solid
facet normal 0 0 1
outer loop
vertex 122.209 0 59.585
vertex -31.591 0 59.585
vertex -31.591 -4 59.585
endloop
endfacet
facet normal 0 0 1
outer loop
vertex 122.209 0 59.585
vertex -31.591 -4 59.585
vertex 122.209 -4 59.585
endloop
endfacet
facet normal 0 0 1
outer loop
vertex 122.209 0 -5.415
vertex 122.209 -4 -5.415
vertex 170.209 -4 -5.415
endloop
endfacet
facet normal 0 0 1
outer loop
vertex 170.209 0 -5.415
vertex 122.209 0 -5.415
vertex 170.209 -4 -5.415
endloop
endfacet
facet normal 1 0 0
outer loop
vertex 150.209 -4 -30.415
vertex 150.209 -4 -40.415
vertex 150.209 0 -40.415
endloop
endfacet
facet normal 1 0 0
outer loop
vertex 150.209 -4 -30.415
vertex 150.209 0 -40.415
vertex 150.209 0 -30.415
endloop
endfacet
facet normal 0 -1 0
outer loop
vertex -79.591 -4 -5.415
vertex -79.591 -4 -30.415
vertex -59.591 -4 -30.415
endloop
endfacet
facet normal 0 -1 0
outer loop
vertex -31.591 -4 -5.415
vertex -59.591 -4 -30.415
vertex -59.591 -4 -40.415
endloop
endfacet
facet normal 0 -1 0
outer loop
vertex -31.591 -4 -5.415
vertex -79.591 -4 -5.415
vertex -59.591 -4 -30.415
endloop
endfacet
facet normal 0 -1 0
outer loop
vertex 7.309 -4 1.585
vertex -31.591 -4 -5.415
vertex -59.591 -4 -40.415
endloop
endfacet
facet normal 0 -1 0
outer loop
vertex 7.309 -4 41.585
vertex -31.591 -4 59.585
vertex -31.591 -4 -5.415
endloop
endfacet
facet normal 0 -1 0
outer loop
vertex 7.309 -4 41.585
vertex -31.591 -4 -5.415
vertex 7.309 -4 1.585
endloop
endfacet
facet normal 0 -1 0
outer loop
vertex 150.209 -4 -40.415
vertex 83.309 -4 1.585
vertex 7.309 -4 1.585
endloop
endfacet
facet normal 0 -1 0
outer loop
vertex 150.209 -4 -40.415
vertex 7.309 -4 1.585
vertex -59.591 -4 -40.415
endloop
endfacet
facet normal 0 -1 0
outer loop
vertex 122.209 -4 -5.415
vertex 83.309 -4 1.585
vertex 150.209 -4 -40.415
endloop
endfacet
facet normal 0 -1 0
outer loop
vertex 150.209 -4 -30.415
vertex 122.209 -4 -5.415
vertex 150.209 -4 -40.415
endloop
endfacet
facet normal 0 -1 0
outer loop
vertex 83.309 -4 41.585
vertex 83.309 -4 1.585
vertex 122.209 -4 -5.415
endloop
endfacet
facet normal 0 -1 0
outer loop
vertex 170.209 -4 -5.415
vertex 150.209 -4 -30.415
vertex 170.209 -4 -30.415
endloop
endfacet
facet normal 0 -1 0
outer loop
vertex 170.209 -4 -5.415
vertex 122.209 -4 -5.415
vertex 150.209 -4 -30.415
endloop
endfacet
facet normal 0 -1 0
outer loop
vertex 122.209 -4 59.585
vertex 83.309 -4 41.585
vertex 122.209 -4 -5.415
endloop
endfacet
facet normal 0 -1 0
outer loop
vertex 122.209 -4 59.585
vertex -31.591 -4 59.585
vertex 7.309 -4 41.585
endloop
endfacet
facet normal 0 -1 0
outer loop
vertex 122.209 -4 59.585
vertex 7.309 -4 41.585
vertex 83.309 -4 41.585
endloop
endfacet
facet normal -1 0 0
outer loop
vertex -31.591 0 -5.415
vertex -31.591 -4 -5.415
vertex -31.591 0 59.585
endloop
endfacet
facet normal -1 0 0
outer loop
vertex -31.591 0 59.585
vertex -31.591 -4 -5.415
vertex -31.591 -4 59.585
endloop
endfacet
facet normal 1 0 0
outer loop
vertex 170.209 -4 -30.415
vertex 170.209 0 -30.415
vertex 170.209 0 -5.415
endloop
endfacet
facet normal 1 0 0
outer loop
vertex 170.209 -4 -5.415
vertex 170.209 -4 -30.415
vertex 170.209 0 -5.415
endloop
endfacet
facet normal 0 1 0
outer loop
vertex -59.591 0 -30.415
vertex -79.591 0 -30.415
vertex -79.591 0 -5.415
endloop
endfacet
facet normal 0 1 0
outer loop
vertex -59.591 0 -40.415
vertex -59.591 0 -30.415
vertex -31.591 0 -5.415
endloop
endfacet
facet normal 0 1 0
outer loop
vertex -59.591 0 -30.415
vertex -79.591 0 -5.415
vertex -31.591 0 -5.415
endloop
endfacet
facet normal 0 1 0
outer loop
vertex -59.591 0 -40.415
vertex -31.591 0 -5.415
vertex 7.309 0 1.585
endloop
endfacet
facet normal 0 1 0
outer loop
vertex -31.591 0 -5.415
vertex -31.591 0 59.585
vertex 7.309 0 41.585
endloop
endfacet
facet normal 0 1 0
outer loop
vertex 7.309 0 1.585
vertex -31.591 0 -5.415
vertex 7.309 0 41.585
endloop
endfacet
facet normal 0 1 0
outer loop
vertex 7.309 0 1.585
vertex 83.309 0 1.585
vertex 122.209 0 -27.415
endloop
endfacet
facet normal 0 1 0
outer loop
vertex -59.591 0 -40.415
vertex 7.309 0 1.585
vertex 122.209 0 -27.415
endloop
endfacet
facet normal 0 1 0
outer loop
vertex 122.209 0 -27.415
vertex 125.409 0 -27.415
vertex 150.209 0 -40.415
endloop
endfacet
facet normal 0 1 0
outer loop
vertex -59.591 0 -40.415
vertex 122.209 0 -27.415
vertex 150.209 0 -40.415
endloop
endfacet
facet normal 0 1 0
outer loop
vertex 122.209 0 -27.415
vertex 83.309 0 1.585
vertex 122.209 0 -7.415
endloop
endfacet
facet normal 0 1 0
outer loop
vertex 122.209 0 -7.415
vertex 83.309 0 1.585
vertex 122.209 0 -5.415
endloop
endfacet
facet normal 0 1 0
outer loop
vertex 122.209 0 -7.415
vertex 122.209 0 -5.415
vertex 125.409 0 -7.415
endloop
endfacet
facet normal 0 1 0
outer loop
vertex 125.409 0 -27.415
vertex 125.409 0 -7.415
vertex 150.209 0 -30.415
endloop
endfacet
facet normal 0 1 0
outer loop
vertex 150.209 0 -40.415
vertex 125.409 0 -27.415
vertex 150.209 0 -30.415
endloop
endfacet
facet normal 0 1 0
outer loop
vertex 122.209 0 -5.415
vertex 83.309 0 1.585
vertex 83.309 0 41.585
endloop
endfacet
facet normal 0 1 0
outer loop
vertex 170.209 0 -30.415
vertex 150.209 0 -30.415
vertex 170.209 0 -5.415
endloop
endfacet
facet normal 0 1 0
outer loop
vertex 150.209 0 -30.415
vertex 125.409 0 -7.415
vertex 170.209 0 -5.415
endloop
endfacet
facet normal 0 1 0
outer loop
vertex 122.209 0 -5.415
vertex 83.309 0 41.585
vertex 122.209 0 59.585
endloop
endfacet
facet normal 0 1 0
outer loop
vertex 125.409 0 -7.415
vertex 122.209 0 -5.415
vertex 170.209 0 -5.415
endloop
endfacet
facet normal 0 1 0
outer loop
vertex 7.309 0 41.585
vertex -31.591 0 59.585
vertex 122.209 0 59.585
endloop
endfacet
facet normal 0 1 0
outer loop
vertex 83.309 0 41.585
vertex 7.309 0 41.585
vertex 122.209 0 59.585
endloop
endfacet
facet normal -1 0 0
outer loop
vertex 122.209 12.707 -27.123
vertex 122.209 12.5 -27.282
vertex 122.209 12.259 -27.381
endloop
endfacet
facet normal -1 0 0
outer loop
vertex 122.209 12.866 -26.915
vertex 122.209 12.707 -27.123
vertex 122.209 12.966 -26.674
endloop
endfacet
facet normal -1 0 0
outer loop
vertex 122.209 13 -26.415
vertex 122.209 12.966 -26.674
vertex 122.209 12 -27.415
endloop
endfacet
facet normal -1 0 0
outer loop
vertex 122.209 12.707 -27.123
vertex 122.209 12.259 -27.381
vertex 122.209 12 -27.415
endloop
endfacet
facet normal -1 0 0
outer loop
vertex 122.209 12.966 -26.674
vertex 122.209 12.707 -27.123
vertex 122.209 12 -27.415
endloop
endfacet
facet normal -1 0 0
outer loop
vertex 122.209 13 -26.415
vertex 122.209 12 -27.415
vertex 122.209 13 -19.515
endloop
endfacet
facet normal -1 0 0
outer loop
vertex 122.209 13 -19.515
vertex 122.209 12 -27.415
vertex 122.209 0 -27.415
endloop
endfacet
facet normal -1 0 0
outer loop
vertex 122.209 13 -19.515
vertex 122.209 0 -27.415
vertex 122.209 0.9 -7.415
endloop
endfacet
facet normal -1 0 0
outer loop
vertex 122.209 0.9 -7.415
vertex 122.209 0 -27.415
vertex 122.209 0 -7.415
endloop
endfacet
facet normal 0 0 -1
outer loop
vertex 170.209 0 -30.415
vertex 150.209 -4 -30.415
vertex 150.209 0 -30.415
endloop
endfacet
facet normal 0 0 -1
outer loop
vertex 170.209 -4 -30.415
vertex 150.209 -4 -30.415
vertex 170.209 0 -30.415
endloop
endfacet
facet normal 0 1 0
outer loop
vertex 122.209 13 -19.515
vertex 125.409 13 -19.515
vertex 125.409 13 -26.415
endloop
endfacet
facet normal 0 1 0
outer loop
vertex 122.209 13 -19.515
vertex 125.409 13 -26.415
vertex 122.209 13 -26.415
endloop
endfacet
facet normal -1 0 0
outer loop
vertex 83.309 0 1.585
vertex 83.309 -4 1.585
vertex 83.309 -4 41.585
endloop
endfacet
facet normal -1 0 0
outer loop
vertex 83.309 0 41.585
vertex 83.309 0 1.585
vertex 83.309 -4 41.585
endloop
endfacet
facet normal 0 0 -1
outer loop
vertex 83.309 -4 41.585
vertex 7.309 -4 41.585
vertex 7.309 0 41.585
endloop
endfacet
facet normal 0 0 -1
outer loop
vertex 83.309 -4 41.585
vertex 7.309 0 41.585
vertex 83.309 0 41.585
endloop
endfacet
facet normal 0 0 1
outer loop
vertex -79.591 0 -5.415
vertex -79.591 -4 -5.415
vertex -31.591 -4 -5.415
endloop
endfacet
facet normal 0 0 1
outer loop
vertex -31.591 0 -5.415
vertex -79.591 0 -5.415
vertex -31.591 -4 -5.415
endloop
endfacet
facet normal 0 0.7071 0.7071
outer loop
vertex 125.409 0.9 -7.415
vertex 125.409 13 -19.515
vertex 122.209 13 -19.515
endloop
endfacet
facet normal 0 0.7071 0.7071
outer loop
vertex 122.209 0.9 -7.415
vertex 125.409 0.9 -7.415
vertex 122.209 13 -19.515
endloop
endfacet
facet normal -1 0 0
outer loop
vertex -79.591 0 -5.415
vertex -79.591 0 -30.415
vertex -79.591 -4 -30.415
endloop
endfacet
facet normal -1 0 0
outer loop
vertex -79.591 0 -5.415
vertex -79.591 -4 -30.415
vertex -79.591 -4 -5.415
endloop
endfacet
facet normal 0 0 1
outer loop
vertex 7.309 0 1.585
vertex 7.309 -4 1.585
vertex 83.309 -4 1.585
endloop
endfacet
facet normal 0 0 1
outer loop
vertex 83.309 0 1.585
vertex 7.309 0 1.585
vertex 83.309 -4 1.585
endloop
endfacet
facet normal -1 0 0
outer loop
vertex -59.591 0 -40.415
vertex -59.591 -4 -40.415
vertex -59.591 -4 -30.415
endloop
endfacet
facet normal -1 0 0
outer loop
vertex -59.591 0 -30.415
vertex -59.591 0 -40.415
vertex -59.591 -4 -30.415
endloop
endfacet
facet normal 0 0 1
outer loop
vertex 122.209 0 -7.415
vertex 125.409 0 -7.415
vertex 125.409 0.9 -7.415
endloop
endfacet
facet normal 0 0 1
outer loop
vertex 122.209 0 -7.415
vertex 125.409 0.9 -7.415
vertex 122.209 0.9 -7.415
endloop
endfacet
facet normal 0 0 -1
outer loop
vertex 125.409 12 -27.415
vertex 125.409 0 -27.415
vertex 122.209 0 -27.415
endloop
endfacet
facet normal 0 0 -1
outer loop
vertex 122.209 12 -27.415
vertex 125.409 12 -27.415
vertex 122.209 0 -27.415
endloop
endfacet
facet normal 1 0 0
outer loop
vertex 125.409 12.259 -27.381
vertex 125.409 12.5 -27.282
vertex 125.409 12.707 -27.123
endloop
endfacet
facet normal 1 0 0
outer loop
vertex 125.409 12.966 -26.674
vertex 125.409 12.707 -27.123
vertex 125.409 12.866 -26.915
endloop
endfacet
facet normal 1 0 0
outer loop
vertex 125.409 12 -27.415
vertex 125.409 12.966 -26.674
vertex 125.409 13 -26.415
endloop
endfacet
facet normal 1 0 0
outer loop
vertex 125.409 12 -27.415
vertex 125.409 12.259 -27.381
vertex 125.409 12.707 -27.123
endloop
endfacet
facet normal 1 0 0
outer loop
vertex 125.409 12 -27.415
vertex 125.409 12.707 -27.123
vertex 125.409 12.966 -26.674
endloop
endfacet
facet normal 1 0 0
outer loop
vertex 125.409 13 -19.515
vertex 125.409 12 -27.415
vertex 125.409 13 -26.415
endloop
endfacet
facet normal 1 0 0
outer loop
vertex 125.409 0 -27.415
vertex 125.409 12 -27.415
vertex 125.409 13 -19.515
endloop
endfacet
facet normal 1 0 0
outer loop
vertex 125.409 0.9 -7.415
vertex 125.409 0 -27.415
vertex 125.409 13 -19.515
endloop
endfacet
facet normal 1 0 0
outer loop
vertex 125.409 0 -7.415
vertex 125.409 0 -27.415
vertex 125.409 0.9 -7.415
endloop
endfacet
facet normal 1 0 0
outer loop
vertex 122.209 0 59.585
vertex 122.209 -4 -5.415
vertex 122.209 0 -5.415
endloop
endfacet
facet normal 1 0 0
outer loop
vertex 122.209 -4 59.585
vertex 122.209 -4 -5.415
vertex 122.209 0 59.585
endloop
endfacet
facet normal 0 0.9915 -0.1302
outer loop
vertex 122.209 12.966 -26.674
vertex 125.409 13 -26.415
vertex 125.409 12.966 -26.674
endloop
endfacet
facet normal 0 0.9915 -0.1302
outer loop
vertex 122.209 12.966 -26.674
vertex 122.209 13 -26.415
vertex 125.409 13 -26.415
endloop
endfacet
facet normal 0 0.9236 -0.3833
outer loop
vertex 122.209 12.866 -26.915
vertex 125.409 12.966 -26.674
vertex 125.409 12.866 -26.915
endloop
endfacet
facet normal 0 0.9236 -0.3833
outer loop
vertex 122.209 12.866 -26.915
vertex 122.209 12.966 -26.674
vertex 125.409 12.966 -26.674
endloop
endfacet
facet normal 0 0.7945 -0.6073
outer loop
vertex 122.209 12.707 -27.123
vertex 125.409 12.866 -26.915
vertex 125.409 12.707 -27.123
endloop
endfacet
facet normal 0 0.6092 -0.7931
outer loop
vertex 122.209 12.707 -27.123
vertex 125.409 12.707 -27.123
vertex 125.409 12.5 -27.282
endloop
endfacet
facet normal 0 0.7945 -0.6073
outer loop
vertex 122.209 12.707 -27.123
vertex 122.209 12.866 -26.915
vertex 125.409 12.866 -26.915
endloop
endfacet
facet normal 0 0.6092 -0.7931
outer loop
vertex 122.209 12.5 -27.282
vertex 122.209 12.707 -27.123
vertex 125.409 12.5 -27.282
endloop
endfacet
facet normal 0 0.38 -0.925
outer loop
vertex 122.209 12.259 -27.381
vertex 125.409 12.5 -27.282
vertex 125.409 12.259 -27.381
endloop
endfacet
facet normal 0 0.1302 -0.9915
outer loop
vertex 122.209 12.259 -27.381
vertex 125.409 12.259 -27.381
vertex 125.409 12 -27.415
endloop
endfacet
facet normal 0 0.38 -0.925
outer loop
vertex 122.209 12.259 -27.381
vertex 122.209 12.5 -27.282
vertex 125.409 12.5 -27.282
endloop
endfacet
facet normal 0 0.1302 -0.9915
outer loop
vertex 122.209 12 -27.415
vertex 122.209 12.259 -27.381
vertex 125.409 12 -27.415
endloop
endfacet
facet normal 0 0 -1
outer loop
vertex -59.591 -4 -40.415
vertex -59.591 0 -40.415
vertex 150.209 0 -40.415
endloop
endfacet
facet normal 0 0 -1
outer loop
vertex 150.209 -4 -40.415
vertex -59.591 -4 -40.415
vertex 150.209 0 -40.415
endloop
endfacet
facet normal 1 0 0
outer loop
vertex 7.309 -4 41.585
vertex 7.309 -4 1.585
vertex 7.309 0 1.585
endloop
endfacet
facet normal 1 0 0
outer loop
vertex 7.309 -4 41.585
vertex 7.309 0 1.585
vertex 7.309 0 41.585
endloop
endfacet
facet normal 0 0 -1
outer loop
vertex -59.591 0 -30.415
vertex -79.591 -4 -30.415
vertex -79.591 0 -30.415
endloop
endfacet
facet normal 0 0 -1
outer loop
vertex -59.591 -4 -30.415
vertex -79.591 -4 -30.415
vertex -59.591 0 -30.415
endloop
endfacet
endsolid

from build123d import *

# Parameters (mm, degrees)
F0_W     = 249.8
F0_H     = 100
F1_DEPTH = 4
F2_W     = 20
F2_H     = 10
F3_DEPTH = 25
F4_W     = 76
F4_H     = 40
F4_W_2   = 48
F4_H_2   = 65
F5_DEPTH = 25
F6_W     = 3.2
F6_H     = 20
F7_DEPTH = 13
F8_SIZE  = 12.1
F9_R     = 1


with BuildPart() as f1:
    # F0 (on Front) → F1 (new body)
    with BuildSketch(Plane.XZ):
        with Locations((45.308904, 9.584513)):
            Rectangle(F0_W, F0_H)
    extrude(amount=F1_DEPTH)

    # F2 (on face) → F3 (cut)
    with BuildSketch(Plane.XZ.offset(4)):
        with Locations((160.208904, -35.415487)):
            Rectangle(F2_W, F2_H)
        with Locations((-69.591096, -35.415487)):
            Rectangle(F2_W, F2_H)
    extrude(amount=-F3_DEPTH, mode=Mode.SUBTRACT)

    # F4 (on face) → F5 (cut)
    with BuildSketch(Plane.XZ.offset(4)):
        with Locations((45.308904, 21.584513)):
            Rectangle(F4_W, F4_H)
        with Locations((-55.591096, 27.084513)):
            Rectangle(F4_W_2, F4_H_2)
        with Locations((146.208904, 27.084513)):
            Rectangle(F4_W_2, F4_H_2)
    extrude(amount=-F5_DEPTH, mode=Mode.SUBTRACT)

    # F6 (on face) → F7 (join)
    with BuildSketch(Plane(origin=(0, 0, 0), x_dir=(-1, 0, 0), z_dir=(0, 1, 0))):
        with Locations((-123.808904, -17.415487)):
            Rectangle(F6_W, F6_H)
    extrude(amount=F7_DEPTH)

    # F8
    f8_edges = [f1.edges().sort_by_distance(p)[0] for p in [
        (123.808904, 13, -7.415487),
    ]]
    chamfer(f8_edges, length=F8_SIZE)

    # F9
    f9_edges = [f1.edges().sort_by_distance(p)[0] for p in [
        (123.808904, 13, -27.415487),
    ]]
    fillet(f9_edges, radius=F9_R)


solid = f1.part
